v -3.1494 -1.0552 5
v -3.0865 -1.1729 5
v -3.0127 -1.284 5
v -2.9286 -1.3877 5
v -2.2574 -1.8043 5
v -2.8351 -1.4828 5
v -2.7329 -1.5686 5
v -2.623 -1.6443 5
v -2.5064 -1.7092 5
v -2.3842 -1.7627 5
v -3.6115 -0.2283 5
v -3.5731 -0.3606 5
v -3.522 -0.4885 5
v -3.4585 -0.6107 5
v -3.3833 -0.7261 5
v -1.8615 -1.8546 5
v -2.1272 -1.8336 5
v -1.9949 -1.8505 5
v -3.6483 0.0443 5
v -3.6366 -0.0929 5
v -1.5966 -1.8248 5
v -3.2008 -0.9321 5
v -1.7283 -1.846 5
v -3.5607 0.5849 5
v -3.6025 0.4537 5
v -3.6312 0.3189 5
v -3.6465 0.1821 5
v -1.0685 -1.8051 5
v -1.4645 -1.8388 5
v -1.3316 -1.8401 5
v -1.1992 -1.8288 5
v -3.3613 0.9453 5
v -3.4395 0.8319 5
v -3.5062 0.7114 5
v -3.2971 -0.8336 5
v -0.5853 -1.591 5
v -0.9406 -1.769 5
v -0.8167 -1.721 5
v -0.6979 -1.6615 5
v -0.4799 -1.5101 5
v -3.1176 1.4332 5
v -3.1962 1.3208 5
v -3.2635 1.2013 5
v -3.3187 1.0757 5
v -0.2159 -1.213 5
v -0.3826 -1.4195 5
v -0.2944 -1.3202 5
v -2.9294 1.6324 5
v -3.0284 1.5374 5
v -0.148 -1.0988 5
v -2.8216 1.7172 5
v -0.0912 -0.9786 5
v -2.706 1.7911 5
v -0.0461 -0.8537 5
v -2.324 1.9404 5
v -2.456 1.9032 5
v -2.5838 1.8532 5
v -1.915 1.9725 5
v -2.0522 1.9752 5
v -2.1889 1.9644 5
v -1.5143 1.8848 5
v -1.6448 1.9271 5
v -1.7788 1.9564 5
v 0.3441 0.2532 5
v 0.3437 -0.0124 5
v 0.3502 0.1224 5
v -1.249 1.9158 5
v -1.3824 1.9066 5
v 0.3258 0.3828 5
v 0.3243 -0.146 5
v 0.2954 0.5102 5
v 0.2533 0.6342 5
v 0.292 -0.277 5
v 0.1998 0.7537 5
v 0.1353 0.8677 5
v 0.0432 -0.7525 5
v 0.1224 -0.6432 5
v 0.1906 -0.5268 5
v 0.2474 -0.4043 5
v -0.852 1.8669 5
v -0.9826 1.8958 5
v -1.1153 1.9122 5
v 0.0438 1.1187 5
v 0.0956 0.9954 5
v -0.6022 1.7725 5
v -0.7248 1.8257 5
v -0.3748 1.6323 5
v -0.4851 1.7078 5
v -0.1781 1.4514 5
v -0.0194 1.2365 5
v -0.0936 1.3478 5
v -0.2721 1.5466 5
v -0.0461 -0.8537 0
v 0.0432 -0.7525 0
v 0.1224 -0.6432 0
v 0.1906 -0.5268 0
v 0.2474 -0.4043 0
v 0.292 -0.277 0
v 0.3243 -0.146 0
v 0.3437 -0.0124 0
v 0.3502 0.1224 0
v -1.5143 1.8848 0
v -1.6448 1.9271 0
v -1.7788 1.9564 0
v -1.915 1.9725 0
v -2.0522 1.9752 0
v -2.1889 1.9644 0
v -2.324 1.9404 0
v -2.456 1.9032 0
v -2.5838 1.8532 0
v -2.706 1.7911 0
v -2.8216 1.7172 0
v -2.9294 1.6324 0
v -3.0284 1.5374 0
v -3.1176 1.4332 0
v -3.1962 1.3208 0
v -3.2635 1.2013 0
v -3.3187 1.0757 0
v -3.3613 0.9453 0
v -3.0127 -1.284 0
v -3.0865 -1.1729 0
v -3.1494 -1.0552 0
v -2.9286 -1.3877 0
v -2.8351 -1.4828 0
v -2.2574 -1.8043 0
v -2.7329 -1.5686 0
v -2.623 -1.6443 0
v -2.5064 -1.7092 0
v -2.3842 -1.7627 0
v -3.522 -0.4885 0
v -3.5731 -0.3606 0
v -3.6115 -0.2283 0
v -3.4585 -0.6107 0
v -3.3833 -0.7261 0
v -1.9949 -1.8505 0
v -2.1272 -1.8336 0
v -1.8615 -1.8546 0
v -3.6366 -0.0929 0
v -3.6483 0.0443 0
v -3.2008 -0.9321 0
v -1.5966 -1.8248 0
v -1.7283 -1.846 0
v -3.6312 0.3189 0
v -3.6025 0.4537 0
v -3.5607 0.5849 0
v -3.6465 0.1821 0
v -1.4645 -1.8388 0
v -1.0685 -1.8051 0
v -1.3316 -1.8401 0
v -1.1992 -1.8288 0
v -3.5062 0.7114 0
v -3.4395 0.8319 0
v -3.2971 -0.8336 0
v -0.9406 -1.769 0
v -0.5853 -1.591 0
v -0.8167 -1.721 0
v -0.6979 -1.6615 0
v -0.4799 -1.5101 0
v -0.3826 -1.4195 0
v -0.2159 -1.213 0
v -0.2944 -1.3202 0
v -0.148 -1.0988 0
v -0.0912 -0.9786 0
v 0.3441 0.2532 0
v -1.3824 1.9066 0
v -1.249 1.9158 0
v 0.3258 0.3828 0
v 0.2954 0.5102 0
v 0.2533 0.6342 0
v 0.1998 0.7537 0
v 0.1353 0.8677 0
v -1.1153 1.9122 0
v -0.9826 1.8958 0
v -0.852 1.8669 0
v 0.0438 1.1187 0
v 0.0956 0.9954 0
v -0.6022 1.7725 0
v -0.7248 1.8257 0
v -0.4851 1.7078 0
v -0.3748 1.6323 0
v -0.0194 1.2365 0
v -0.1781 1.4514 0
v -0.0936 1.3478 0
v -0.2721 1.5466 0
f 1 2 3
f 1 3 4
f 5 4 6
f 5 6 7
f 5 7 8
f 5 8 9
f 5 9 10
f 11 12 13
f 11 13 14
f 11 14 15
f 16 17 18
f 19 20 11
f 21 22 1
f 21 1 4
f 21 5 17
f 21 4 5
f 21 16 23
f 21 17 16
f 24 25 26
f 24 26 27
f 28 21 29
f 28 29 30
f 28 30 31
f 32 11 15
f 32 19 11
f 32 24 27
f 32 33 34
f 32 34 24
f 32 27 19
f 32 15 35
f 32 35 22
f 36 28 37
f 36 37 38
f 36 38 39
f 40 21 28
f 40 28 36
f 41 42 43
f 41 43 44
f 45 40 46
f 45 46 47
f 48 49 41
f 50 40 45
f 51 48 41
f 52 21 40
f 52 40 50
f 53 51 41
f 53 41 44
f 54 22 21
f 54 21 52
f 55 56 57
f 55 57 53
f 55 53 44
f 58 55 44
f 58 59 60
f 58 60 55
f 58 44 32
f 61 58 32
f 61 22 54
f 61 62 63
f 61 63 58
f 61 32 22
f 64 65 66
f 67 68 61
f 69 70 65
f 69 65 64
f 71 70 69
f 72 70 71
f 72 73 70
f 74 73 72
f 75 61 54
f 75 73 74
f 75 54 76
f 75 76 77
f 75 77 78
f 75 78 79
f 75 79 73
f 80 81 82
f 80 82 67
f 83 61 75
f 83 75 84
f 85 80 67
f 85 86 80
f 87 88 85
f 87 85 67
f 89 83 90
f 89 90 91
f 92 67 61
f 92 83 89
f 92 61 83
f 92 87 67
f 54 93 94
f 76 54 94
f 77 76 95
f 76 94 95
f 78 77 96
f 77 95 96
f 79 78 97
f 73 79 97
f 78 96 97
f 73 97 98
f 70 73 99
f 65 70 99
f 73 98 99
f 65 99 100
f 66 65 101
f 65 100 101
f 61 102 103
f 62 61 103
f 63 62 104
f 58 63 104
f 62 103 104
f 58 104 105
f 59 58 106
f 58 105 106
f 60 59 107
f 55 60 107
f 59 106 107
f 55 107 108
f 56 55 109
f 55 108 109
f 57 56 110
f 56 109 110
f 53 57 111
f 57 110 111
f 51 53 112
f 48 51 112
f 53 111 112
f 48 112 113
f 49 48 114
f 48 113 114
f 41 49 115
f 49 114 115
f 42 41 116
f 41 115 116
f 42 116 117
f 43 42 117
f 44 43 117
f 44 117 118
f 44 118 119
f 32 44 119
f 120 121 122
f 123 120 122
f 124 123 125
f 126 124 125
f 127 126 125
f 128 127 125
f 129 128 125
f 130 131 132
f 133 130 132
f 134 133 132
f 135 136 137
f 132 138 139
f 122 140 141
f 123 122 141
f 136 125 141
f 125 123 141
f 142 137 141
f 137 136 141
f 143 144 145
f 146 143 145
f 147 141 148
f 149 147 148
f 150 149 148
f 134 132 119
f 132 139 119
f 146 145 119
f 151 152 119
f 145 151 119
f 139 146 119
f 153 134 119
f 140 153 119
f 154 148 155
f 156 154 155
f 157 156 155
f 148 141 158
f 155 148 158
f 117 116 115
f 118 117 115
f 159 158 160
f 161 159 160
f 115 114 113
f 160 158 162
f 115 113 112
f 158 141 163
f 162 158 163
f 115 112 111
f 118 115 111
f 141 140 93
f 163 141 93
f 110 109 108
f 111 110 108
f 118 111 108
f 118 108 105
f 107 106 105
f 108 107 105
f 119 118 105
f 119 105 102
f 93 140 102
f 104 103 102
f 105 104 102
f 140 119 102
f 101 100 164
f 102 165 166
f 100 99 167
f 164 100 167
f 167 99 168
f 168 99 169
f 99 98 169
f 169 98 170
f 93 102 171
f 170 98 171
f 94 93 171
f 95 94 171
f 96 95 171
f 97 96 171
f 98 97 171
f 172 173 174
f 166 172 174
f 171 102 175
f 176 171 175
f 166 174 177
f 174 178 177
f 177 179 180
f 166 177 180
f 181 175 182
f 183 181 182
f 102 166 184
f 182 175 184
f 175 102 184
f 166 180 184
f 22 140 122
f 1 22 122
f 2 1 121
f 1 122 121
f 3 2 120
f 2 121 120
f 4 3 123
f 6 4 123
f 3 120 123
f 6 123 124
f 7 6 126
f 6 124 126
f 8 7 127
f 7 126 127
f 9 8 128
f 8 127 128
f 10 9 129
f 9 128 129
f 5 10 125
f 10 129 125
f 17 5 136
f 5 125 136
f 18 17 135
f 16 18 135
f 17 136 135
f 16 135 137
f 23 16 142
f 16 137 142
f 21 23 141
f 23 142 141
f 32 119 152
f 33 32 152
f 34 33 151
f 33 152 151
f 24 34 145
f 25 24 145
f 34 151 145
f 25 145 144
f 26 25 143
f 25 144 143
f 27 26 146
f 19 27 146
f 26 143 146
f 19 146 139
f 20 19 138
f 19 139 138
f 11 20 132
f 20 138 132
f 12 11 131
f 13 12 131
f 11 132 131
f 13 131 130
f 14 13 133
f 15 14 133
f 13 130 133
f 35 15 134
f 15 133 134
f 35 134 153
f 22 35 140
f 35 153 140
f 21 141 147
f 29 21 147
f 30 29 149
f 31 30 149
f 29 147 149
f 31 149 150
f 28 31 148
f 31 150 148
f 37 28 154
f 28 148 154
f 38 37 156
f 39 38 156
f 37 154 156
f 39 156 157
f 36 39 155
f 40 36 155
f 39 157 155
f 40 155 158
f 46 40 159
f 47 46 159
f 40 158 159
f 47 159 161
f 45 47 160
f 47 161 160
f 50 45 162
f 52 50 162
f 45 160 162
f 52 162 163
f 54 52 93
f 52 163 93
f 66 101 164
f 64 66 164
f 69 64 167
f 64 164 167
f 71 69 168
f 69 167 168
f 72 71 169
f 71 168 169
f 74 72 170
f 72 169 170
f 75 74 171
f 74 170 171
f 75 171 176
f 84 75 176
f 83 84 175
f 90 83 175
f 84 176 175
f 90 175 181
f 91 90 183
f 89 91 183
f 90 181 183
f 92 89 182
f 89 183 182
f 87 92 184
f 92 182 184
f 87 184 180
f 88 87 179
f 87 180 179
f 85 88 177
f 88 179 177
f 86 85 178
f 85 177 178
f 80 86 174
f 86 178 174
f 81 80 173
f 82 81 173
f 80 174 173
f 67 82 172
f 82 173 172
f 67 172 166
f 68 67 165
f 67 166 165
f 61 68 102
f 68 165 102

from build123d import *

# Parameters (mm, degrees)
F1_DEPTH = 5


with BuildPart() as f1:
    # F0 (on Top) → F1 (new body)
    with BuildSketch(Plane.XY):
        with BuildLine():
            ThreePointArc((-0.8988943353, -0.2747050753), (-0.8617178067, -0.0916116385), (-0.8492516278, 0.0948015993))
            ThreePointArc((-0.8492516278, 0.0948015993), (-0.8703764644, 0.3370892048), (-0.9331134618, 0.5720649731))
            ThreePointArc((-0.9331134618, 0.5720649731), (-1.2758447362, 0.8058613037), (-1.6720459361, 0.9289468827))
            ThreePointArc((-1.6720459361, 0.9289468827), (-2.0592079143, 0.785294631), (-2.3876180715, 0.5349406108))
            ThreePointArc((-2.3876180715, 0.5349406108), (-2.4494314254, 0.1540414271), (-2.4049112303, -0.2292639747))
            ThreePointArc((-2.4049112303, -0.2292639747), (-2.1066312225, -0.5672202335), (-1.7164187622, -0.7928740206))
            ThreePointArc((-1.7164187622, -0.7928740206), (-1.2614520098, -0.6066872767), (-0.8988943353, -0.2747050753))
        make_face()
        with BuildLine():
            ThreePointArc((-0.9331134618, 0.5720649731), (-0.8703764644, 0.3370892048), (-0.8492516278, 0.0948015993))
            ThreePointArc((-0.8492516278, 0.0948015993), (-0.8617178067, -0.0916116385), (-0.8988943353, -0.2747050753))
            ThreePointArc((-0.8988943353, -0.2747050753), (-0.7536616022, -0.0400351914), (-0.6572847743, 0.2185649019))
            ThreePointArc((-0.6572847743, 0.2185649019), (-0.7809552435, 0.4064291339), (-0.9331134618, 0.5720649731))
        make_face()
        with BuildLine():
            ThreePointArc((-1.6720459361, 0.9289468827), (-1.2758447362, 0.8058613037), (-0.9331134618, 0.5720649731))
            ThreePointArc((-0.9331134618, 0.5720649731), (-1.0180125198, 0.7611725612), (-1.1299043154, 0.9356711457))
            ThreePointArc((-1.1299043154, 0.9356711457), (-1.401303752, 0.9588044056), (-1.6720459361, 0.9289468827))
        make_face()
        with BuildLine():
            ThreePointArc((-1.1299043154, 0.9356711457), (-1.0180125198, 0.7611725612), (-0.9331134618, 0.5720649731))
            ThreePointArc((-0.9331134618, 0.5720649731), (-0.7809552435, 0.4064291339), (-0.6572847743, 0.2185649019))
            ThreePointArc((-0.6572847743, 0.2185649019), (-0.6225755838, 0.3956834749), (-0.6109413992, 0.5757955583))
            ThreePointArc((-0.6109413992, 0.5757955583), (-0.6131255758, 0.653967956), (-0.6196712903, 0.7318964362))
            ThreePointArc((-0.6196712903, 0.7318964362), (-0.8646934504, 0.8590591156), (-1.1299043154, 0.9356711457))
        make_face()
        with BuildLine():
            ThreePointArc((-0.6572847743, 0.2185649019), (-0.7536616022, -0.0400351914), (-0.8988943353, -0.2747050753))
            ThreePointArc((-0.8988943353, -0.2747050753), (-1.0346269029, -0.6013928976), (-1.2479146616, -0.8836278975))
            ThreePointArc((-1.2479146616, -0.8836278975), (-0.8622582937, -0.8374797639), (-0.5041231237, -0.6871478501))
            ThreePointArc((-0.5041231237, -0.6871478501), (-0.4895710534, -0.5713821921), (-0.4847091068, -0.4548068438))
            ThreePointArc((-0.4847091068, -0.4548068438), (-0.5285391201, -0.1072396313), (-0.6572847743, 0.2185649019))
        make_face()
        with BuildLine():
            ThreePointArc((-1.2479146616, -0.8836278975), (-1.0346269029, -0.6013928976), (-0.8988943353, -0.2747050753))
            ThreePointArc((-0.8988943353, -0.2747050753), (-1.2614520098, -0.6066872767), (-1.7164187622, -0.7928740206))
            ThreePointArc((-1.7164187622, -0.7928740206), (-1.4860620777, -0.858360236), (-1.2479146616, -0.8836278975))
        make_face()
        with BuildLine():
            ThreePointArc((-1.6720459361, 0.9289468827), (-1.401303752, 0.9588044056), (-1.1299043154, 0.9356711457))
            ThreePointArc((-1.1299043154, 0.9356711457), (-1.3763843902, 1.1893804158), (-1.678585825, 1.3732148899))
            ThreePointArc((-1.678585825, 1.3732148899), (-1.9737758003, 1.174153066), (-2.2092071036, 0.907067251))
            ThreePointArc((-2.2092071036, 0.907067251), (-1.9416866169, 0.944033234), (-1.6720459361, 0.9289468827))
        make_face()
        with BuildLine():
            ThreePointArc((-1.678585825, 1.3732148899), (-1.3763843902, 1.1893804158), (-1.1299043154, 0.9356711457))
            ThreePointArc((-1.1299043154, 0.9356711457), (-0.8646934504, 0.8590591156), (-0.6196712903, 0.7318964362))
            ThreePointArc((-0.6196712903, 0.7318964362), (-0.7361879783, 1.1545906135), (-0.9777387946, 1.5205137056))
            ThreePointArc((-0.9777387946, 1.5205137056), (-1.3377402962, 1.4924363094), (-1.678585825, 1.3732148899))
        make_face()
        with BuildLine():
            ThreePointArc((-0.6109413992, 0.5757955583), (-0.6225755838, 0.3956834749), (-0.6572847743, 0.2185649019))
            ThreePointArc((-0.6572847743, 0.2185649019), (-0.5285391201, -0.1072396313), (-0.4847091068, -0.4548068438))
            ThreePointArc((-0.4847091068, -0.4548068438), (-0.4895710534, -0.5713821921), (-0.5041231237, -0.6871478501))
            ThreePointArc((-0.5041231237, -0.6871478501), (-0.2236607638, -0.4676130058), (-0.0076714351, -0.1844111467))
            ThreePointArc((-0.0076714351, -0.1844111467), (-0.2197322329, 0.3364843866), (-0.6196712903, 0.7318964362))
            ThreePointArc((-0.6196712903, 0.7318964362), (-0.6131255758, 0.653967956), (-0.6109413992, 0.5757955583))
        make_face()
        with BuildLine():
            ThreePointArc((-2.3876180715, 0.5349406108), (-2.0592079143, 0.785294631), (-1.6720459361, 0.9289468827))
            ThreePointArc((-1.6720459361, 0.9289468827), (-1.9416866169, 0.944033234), (-2.2092071036, 0.907067251))
            ThreePointArc((-2.2092071036, 0.907067251), (-2.3121995682, 0.727613908), (-2.3876180715, 0.5349406108))
        make_face()
        with BuildLine():
            ThreePointArc((-0.5041231237, -0.6871478501), (-0.8622582937, -0.8374797639), (-1.2479146616, -0.8836278975))
            ThreePointArc((-1.2479146616, -0.8836278975), (-1.4228823891, -1.0352930345), (-1.6204555397, -1.1560443063))
            ThreePointArc((-1.6204555397, -1.1560443063), (-1.1797554002, -1.2715854362), (-0.7252917401, -1.2395051105))
            ThreePointArc((-0.7252917401, -1.2395051105), (-0.5850249567, -0.9752115997), (-0.5041231237, -0.6871478501))
        make_face()
        with BuildLine():
            ThreePointArc((-1.6204555397, -1.1560443063), (-1.4228823891, -1.0352930345), (-1.2479146616, -0.8836278975))
            ThreePointArc((-1.2479146616, -0.8836278975), (-1.4860620777, -0.858360236), (-1.7164187622, -0.7928740206))
            ThreePointArc((-1.7164187622, -0.7928740206), (-1.8987335129, -0.8197005507), (-2.0829923414, -0.822349163))
            ThreePointArc((-2.0829923414, -0.822349163), (-1.8688969211, -1.013000304), (-1.6204555397, -1.1560443063))
        make_face()
        with BuildLine():
            ThreePointArc((-2.0829923414, -0.822349163), (-1.8987335129, -0.8197005507), (-1.7164187622, -0.7928740206))
            ThreePointArc((-1.7164187622, -0.7928740206), (-2.1066312225, -0.5672202335), (-2.4049112303, -0.2292639747))
            ThreePointArc((-2.4049112303, -0.2292639747), (-2.2802207628, -0.5454928955), (-2.0829923414, -0.822349163))
        make_face()
        with BuildLine():
            ThreePointArc((-2.2092071036, 0.907067251), (-1.9737758003, 1.174153066), (-1.678585825, 1.3732148899))
            ThreePointArc((-1.678585825, 1.3732148899), (-1.9437880524, 1.461070974), (-2.2211544181, 1.4945196233))
            ThreePointArc((-2.2211544181, 1.4945196233), (-2.4678363793, 1.1504786171), (-2.600403435, 0.7484311329))
            ThreePointArc((-2.600403435, 0.7484311329), (-2.4108187653, 0.8425784603), (-2.2092071036, 0.907067251))
        make_face()
        with BuildLine():
            ThreePointArc((-2.2211544181, 1.4945196233), (-1.9437880524, 1.461070974), (-1.678585825, 1.3732148899))
            ThreePointArc((-1.678585825, 1.3732148899), (-1.3377402962, 1.4924363094), (-0.9777387946, 1.5205137056))
            ThreePointArc((-0.9777387946, 1.5205137056), (-1.2246565961, 1.7341375667), (-1.5143400889, 1.8847597055))
            ThreePointArc((-1.5143400889, 1.8847597055), (-1.8964893504, 1.7416981968), (-2.2211544181, 1.4945196233))
        make_face()
        with BuildLine():
            ThreePointArc((-0.9777387946, 1.5205137056), (-0.7361879783, 1.1545906135), (-0.6196712903, 0.7318964362))
            ThreePointArc((-0.6196712903, 0.7318964362), (-0.2197322329, 0.3364843866), (-0.0076714351, -0.1844111467))
            ThreePointArc((-0.0076714351, -0.1844111467), (0.1324037622, 0.153463889), (0.1801825481, 0.5160901266))
            ThreePointArc((0.1801825481, 0.5160901266), (0.1689176004, 0.6933327697), (0.1353040416, 0.8677230856))
            ThreePointArc((0.1353040416, 0.8677230856), (-0.3415262897, 1.3299959505), (-0.9777387946, 1.5205137056))
        make_face()
        with BuildLine():
            ThreePointArc((-2.3876180715, 0.5349406108), (-2.3121995682, 0.727613908), (-2.2092071036, 0.907067251))
            ThreePointArc((-2.2092071036, 0.907067251), (-2.4108187653, 0.8425784603), (-2.600403435, 0.7484311329))
            ThreePointArc((-2.600403435, 0.7484311329), (-2.6197629094, 0.5037322971), (-2.5960866966, 0.2594133531))
            ThreePointArc((-2.5960866966, 0.2594133531), (-2.5003846604, 0.4036326478), (-2.3876180715, 0.5349406108))
        make_face()
        with BuildLine():
            ThreePointArc((-2.4049112303, -0.2292639747), (-2.4494314254, 0.1540414271), (-2.3876180715, 0.5349406108))
            ThreePointArc((-2.3876180715, 0.5349406108), (-2.5003846604, 0.4036326478), (-2.5960866966, 0.2594133531))
            ThreePointArc((-2.5960866966, 0.2594133531), (-2.5235990735, 0.0060376947), (-2.4049112303, -0.2292639747))
        make_face()
        with BuildLine():
            ThreePointArc((-0.7252917401, -1.2395051105), (-1.1797554002, -1.2715854362), (-1.6204555397, -1.1560443063))
            ThreePointArc((-1.6204555397, -1.1560443063), (-2.0515783023, -1.2911728797), (-2.5032879922, -1.2819574666))
            ThreePointArc((-2.5032879922, -1.2819574666), (-2.103137308, -1.642235792), (-1.5966038505, -1.8248416468))
            ThreePointArc((-1.5966038505, -1.8248416468), (-1.1040138069, -1.6169233822), (-0.7252917401, -1.2395051105))
        make_face()
        with BuildLine():
            ThreePointArc((-2.5032879922, -1.2819574666), (-2.0515783023, -1.2911728797), (-1.6204555397, -1.1560443063))
            ThreePointArc((-1.6204555397, -1.1560443063), (-1.8688969211, -1.013000304), (-2.0829923414, -0.822349163))
            ThreePointArc((-2.0829923414, -0.822349163), (-2.443991306, -0.7555450361), (-2.7752107887, -0.5971887981))
            ThreePointArc((-2.7752107887, -0.5971887981), (-2.6851043864, -0.9577822288), (-2.5032879922, -1.2819574666))
        make_face()
        with BuildLine():
            ThreePointArc((-0.0076714351, -0.1844111467), (-0.2236607638, -0.4676130058), (-0.5041231237, -0.6871478501))
            ThreePointArc((-0.5041231237, -0.6871478501), (-0.5850249567, -0.9752115997), (-0.7252917401, -1.2395051105))
            ThreePointArc((-0.7252917401, -1.2395051105), (-0.3582467769, -1.0949100858), (-0.0461123451, -0.8536595467))
            ThreePointArc((-0.0461123451, -0.8536595467), (0.0004291531, -0.6497027944), (0.0160593202, -0.4410879202))
            ThreePointArc((0.0160593202, -0.4410879202), (0.0101140076, -0.3122022007), (-0.0076714351, -0.1844111467))
        make_face()
        with BuildLine():
            ThreePointArc((-2.0829923414, -0.822349163), (-2.2802207628, -0.5454928955), (-2.4049112303, -0.2292639747))
            ThreePointArc((-2.4049112303, -0.2292639747), (-2.5235990735, 0.0060376947), (-2.5960866966, 0.2594133531))
            ThreePointArc((-2.5960866966, 0.2594133531), (-2.7543003743, -0.1545319785), (-2.7752107887, -0.5971887981))
            ThreePointArc((-2.7752107887, -0.5971887981), (-2.443991306, -0.7555450361), (-2.0829923414, -0.822349163))
        make_face()
        with BuildLine():
            ThreePointArc((-2.600403435, 0.7484311329), (-2.4678363793, 1.1504786171), (-2.2211544181, 1.4945196233))
            ThreePointArc((-2.2211544181, 1.4945196233), (-2.8568261147, 1.3560919081), (-3.3612986917, 0.9453022329))
            ThreePointArc((-3.3612986917, 0.9453022329), (-3.4013148657, 0.4119003981), (-3.2383657317, -0.0975761874))
            ThreePointArc((-3.2383657317, -0.0975761874), (-3.0025129529, 0.3881134144), (-2.600403435, 0.7484311329))
        make_face()
        with BuildLine():
            ThreePointArc((-3.3612986917, 0.9453022329), (-2.8568261147, 1.3560919081), (-2.2211544181, 1.4945196233))
            ThreePointArc((-2.2211544181, 1.4945196233), (-1.8964893504, 1.7416981968), (-1.5143400889, 1.8847597055))
            ThreePointArc((-1.5143400889, 1.8847597055), (-2.6456617352, 1.8236457476), (-3.3612986917, 0.9453022329))
        make_face()
        with BuildLine():
            ThreePointArc((-1.5143400889, 1.8847597055), (-1.2246565961, 1.7341375667), (-0.9777387946, 1.5205137056))
            ThreePointArc((-0.9777387946, 1.5205137056), (-0.3415262897, 1.3299959505), (0.1353040416, 0.8677230856))
            ThreePointArc((0.1353040416, 0.8677230856), (-0.4851009384, 1.707808065), (-1.5143400889, 1.8847597055))
        make_face()
        with BuildLine():
            ThreePointArc((0.1801825481, 0.5160901266), (0.1324037622, 0.153463889), (-0.0076714351, -0.1844111467))
            ThreePointArc((-0.0076714351, -0.1844111467), (0.0101140076, -0.3122022007), (0.0160593202, -0.4410879202))
            ThreePointArc((0.0160593202, -0.4410879202), (0.0004291531, -0.6497027944), (-0.0461123451, -0.8536595467))
            ThreePointArc((-0.0461123451, -0.8536595467), (0.247351032, -0.4043432956), (0.3502102632, 0.1223689843))
            ThreePointArc((0.3502102632, 0.1223689843), (0.2954112314, 0.5102276636), (0.1353040416, 0.8677230856))
            ThreePointArc((0.1353040416, 0.8677230856), (0.1689176004, 0.6933327697), (0.1801825481, 0.5160901266))
        make_face()
        with BuildLine():
            ThreePointArc((-2.5960866966, 0.2594133531), (-2.6197629094, 0.5037322971), (-2.600403435, 0.7484311329))
            ThreePointArc((-2.600403435, 0.7484311329), (-3.0025129529, 0.3881134144), (-3.2383657317, -0.0975761874))
            ThreePointArc((-3.2383657317, -0.0975761874), (-3.037642018, -0.3759847941), (-2.7752107887, -0.5971887981))
            ThreePointArc((-2.7752107887, -0.5971887981), (-2.7543003743, -0.1545319785), (-2.5960866966, 0.2594133531))
        make_face()
        with BuildLine():
            ThreePointArc((-1.5966038505, -1.8248416468), (-2.103137308, -1.642235792), (-2.5032879922, -1.2819574666))
            ThreePointArc((-2.5032879922, -1.2819574666), (-2.8769397727, -1.1566006513), (-3.2008472728, -0.9320702176))
            ThreePointArc((-3.2008472728, -0.9320702176), (-2.5654977098, -1.6781329974), (-1.5966038505, -1.8248416468))
        make_face()
        with BuildLine():
            ThreePointArc((-3.2008472728, -0.9320702176), (-2.8769397727, -1.1566006513), (-2.5032879922, -1.2819574666))
            ThreePointArc((-2.5032879922, -1.2819574666), (-2.6851043864, -0.9577822288), (-2.7752107887, -0.5971887981))
            ThreePointArc((-2.7752107887, -0.5971887981), (-3.037642018, -0.3759847941), (-3.2383657317, -0.0975761874))
            ThreePointArc((-3.2383657317, -0.0975761874), (-3.2832962968, -0.5176866657), (-3.2008472728, -0.9320702176))
        make_face()
        with BuildLine():
            ThreePointArc((-0.0461123451, -0.8536595467), (-0.3582467769, -1.0949100858), (-0.7252917401, -1.2395051105))
            ThreePointArc((-0.7252917401, -1.2395051105), (-1.1040138069, -1.6169233822), (-1.5966038505, -1.8248416468))
            ThreePointArc((-1.5966038505, -1.8248416468), (-0.6407732495, -1.6275541737), (-0.0461123451, -0.8536595467))
        make_face()
        with BuildLine():
            ThreePointArc((-3.2383657317, -0.0975761874), (-3.4013148657, 0.4119003981), (-3.3612986917, 0.9453022329))
            ThreePointArc((-3.3612986917, 0.9453022329), (-3.6441663697, -0.0244161134), (-3.2008472728, -0.9320702176))
            ThreePointArc((-3.2008472728, -0.9320702176), (-3.2832962968, -0.5176866657), (-3.2383657317, -0.0975761874))
        make_face()
    extrude(amount=F1_DEPTH)


solid = f1.part
